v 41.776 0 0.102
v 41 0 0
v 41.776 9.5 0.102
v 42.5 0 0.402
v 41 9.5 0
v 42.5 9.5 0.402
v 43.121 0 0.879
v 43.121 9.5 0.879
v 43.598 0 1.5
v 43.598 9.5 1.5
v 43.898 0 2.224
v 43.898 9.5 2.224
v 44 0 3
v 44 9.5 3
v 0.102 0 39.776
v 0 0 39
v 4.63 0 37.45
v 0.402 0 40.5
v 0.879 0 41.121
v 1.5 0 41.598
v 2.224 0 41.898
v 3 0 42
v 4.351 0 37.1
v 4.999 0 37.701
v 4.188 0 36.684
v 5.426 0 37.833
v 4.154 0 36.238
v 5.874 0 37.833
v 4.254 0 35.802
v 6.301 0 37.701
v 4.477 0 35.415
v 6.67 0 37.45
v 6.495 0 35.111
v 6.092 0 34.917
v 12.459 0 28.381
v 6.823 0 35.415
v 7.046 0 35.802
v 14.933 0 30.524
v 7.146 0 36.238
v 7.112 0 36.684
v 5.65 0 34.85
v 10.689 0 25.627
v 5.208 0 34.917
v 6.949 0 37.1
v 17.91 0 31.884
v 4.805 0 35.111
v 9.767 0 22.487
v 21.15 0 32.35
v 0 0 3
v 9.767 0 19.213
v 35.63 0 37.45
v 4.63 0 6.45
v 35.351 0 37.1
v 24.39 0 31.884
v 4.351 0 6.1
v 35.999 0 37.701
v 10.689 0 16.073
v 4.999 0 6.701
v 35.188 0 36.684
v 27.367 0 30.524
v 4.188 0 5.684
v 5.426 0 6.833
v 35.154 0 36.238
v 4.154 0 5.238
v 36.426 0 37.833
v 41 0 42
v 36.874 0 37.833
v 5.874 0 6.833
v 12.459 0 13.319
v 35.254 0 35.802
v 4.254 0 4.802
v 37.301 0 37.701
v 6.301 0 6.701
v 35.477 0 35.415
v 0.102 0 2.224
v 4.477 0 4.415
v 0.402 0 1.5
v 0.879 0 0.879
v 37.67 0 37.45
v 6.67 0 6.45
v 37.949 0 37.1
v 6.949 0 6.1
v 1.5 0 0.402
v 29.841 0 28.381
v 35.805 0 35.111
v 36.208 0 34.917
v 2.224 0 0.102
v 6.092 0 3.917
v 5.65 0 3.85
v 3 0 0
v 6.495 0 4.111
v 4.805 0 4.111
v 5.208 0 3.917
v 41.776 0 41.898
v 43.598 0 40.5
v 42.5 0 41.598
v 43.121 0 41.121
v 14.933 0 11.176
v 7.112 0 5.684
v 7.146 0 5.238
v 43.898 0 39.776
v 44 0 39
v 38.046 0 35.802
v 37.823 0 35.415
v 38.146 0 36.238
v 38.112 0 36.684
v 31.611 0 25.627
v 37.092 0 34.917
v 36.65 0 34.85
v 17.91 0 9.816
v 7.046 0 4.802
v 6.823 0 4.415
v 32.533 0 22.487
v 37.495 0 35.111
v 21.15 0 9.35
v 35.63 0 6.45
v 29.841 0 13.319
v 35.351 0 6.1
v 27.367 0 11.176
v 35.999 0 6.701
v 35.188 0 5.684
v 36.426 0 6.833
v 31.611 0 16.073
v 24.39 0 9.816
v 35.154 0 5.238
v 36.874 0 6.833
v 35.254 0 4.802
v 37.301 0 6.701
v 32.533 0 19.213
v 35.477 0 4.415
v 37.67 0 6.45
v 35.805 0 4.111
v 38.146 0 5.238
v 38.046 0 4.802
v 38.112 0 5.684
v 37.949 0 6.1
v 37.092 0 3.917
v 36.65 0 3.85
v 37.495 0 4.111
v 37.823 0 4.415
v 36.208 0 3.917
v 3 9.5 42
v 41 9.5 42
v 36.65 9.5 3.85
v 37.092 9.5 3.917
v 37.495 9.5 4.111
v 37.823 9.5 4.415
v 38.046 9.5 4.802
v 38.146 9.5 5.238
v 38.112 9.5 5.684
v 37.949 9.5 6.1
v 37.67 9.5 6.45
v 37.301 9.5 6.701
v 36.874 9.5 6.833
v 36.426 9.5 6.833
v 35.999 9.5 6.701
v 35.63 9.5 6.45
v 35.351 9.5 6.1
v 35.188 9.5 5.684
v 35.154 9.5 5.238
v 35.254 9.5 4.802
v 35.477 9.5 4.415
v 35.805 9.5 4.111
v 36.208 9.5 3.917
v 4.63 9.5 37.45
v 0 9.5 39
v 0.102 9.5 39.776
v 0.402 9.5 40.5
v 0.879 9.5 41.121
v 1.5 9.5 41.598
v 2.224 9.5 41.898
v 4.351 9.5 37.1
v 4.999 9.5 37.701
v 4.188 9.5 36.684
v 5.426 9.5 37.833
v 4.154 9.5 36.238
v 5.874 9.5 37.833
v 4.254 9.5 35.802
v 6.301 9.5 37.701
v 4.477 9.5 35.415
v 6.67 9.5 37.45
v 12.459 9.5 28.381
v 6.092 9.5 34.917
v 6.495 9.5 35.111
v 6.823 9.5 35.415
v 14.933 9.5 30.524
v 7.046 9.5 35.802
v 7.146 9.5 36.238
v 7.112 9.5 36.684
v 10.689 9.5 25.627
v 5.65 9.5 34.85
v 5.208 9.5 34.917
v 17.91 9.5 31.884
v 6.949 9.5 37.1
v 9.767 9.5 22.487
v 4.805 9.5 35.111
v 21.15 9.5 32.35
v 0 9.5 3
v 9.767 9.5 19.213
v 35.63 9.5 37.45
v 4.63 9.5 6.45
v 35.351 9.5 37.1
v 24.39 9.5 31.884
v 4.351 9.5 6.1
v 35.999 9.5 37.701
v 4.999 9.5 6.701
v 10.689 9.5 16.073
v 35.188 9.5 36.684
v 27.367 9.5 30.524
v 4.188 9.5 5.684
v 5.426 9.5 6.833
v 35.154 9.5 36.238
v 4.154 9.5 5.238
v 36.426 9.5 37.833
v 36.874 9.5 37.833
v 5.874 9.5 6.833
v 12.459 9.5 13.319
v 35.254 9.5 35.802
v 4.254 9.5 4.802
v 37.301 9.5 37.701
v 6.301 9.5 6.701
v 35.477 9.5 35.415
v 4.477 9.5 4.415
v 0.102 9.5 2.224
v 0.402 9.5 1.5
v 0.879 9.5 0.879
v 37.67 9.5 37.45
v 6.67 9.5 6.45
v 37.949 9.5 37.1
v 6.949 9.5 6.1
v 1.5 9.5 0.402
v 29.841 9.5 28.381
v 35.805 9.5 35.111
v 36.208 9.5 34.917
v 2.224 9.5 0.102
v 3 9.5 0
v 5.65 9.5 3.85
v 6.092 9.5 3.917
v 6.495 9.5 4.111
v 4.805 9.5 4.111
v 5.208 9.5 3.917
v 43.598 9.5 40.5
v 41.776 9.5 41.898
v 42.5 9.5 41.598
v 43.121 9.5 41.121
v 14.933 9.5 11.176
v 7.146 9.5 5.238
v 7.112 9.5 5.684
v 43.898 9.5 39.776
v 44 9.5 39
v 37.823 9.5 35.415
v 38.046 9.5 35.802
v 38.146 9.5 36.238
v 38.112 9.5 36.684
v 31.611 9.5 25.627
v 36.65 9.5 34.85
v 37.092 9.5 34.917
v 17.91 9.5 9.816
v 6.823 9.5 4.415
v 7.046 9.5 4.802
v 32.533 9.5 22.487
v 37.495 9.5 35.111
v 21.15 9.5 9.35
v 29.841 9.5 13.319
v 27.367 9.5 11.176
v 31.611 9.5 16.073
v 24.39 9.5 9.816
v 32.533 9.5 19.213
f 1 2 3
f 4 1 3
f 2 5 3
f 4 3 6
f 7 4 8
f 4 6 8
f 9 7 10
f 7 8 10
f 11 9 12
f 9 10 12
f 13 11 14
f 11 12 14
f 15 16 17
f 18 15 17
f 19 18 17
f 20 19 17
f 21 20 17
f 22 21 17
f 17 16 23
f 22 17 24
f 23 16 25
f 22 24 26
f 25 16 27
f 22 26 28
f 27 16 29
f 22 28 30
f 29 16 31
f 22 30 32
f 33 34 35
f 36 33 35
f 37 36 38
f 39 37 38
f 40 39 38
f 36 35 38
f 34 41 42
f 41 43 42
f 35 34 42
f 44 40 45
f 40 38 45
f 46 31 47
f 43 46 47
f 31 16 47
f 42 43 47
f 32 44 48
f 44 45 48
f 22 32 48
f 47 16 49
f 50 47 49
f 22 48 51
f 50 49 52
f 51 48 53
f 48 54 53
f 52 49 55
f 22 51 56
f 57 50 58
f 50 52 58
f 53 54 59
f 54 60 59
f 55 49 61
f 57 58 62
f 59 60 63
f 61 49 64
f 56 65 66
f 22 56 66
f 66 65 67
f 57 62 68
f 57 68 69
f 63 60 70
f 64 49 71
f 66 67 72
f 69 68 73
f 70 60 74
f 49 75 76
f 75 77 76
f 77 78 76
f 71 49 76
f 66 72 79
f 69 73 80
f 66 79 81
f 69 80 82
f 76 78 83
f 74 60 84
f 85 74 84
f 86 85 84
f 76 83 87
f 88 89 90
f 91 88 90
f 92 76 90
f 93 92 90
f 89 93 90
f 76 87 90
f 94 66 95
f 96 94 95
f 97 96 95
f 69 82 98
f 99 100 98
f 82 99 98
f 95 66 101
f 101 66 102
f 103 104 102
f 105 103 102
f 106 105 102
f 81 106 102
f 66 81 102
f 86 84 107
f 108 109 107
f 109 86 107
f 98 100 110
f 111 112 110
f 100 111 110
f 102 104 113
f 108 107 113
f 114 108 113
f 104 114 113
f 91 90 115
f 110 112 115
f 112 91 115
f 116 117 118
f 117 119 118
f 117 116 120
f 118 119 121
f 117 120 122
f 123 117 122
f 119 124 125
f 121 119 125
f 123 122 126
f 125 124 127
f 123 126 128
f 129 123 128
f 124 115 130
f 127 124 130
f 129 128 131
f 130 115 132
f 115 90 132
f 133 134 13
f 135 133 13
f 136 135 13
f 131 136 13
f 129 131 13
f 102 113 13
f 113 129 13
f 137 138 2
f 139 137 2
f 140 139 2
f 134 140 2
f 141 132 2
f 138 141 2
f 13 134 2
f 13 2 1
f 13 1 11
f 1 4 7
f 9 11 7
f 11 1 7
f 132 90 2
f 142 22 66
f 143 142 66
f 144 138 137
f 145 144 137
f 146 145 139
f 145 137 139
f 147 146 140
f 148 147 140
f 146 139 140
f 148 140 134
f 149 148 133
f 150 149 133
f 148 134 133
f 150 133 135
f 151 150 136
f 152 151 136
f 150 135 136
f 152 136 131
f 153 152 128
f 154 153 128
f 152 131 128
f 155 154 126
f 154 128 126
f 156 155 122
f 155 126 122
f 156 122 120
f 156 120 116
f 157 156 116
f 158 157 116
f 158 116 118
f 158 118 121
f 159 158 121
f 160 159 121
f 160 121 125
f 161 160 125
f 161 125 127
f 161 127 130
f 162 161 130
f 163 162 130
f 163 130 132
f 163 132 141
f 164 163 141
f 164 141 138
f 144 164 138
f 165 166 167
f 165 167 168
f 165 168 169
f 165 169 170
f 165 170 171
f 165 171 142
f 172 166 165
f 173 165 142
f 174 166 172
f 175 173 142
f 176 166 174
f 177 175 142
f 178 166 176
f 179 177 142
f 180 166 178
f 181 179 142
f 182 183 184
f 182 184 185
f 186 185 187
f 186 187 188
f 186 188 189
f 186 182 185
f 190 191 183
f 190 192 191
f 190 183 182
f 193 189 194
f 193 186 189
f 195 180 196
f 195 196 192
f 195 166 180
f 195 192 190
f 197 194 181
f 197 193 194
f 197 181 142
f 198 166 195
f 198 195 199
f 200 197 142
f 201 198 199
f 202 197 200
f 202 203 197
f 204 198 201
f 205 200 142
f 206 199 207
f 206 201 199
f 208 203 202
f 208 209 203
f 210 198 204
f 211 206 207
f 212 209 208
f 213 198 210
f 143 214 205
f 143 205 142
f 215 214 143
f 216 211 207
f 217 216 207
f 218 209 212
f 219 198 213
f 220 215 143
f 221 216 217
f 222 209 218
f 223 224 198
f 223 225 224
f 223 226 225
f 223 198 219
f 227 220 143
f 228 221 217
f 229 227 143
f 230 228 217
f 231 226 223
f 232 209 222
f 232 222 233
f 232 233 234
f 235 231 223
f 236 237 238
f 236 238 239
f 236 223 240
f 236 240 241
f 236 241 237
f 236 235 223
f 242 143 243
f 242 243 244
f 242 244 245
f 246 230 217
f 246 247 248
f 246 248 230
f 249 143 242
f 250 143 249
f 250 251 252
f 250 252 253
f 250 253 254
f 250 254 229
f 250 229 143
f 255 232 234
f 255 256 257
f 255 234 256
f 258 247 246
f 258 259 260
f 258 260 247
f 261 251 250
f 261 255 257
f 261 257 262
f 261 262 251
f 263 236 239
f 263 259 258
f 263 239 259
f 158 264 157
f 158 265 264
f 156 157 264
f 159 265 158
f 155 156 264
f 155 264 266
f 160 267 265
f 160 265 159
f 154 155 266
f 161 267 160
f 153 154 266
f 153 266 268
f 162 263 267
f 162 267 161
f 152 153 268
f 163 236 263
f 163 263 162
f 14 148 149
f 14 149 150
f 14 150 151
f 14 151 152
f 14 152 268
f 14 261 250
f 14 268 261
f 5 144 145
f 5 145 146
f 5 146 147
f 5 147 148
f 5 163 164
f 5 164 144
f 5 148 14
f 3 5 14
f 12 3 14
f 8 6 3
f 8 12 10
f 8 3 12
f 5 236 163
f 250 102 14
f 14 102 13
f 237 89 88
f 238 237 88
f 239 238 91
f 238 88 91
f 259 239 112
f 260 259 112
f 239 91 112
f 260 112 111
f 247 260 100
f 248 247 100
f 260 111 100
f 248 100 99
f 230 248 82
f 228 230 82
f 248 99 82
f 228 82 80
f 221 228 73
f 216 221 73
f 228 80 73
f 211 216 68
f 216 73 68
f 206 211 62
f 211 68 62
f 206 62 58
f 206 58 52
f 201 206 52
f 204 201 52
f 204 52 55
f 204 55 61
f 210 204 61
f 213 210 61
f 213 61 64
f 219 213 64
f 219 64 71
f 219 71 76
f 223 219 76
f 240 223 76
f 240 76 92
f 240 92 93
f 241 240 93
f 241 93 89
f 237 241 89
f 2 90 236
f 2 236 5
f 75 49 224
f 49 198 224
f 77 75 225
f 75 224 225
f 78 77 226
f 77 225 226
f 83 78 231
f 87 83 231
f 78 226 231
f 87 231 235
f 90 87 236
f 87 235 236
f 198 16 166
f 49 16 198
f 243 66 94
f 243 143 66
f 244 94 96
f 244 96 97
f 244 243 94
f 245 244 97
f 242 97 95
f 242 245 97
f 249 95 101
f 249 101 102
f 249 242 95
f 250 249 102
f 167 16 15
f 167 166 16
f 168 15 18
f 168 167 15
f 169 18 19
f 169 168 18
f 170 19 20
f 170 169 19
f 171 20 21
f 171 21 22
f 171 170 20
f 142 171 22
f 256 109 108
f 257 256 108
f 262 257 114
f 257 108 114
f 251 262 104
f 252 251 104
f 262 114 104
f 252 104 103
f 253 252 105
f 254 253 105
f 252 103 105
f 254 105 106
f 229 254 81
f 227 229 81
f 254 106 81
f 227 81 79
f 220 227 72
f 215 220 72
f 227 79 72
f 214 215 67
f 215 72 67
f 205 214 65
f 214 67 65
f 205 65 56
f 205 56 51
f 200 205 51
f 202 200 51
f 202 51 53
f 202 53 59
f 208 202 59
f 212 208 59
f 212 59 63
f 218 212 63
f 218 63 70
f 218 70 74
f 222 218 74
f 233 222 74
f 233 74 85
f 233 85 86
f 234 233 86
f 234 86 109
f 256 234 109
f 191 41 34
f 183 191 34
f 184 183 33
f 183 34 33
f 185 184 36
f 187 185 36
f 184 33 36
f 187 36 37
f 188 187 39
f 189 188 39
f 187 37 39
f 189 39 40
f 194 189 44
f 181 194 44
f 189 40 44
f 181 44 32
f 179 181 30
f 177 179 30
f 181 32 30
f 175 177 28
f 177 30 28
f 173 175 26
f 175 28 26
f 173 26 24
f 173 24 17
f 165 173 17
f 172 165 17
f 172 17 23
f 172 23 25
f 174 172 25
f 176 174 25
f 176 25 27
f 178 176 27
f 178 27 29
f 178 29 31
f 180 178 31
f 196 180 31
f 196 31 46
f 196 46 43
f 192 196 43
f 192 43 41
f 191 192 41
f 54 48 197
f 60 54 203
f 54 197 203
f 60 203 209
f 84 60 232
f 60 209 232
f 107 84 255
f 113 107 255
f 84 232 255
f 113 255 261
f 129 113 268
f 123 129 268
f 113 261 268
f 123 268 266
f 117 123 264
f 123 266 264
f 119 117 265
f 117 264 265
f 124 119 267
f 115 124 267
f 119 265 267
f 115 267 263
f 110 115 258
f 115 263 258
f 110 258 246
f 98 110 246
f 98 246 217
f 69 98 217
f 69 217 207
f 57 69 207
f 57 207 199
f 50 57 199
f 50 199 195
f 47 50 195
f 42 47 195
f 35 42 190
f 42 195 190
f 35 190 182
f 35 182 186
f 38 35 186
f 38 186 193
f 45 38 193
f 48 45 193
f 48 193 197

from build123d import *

# Parameters (mm, degrees)
SKETCH_1_W          = 44
SKETCH_1_H          = 42
EXTRUDE_1_DEPTH     = 9.5
SKETCH_2_R          = 11.5
CUT_EXTRUDE_1_DEPTH = 62.565006294
FILLET_1_R          = 3
SKETCH_5_R          = 1.5
CUT_EXTRUDE_2_DEPTH = 62.565006294


with BuildPart() as part:
    # 草图1 → 凸台-拉伸1 (new body)
    with BuildSketch(Plane(origin=(0, 0, 0), x_dir=(1, 0, 0), z_dir=(0, 1, 0))):
        with Locations((22, -21)):
            Rectangle(SKETCH_1_W, SKETCH_1_H)
    extrude(amount=EXTRUDE_1_DEPTH)

    # 草图2 → 切除-拉伸1 (cut, through all)
    with BuildSketch(Plane(origin=(0, 9.5, 0), x_dir=(1, 0, 0), z_dir=(0, 1, 0))):
        with Locations(Location((21.15, -20.85, 0), (0, 0, 270))):
            Circle(SKETCH_2_R)
    extrude(amount=-CUT_EXTRUDE_1_DEPTH, mode=Mode.SUBTRACT)

    # 圆角1
    fillet_1_edges = [part.edges().sort_by_distance(p)[0] for p in [
        (0, 4.75, 0),
        (44, 4.75, 0),
        (44, 4.75, 42),
        (0, 4.75, 42),
    ]]
    fillet(fillet_1_edges, radius=FILLET_1_R)

    # 草图5 → 切除-拉伸2 (cut, through all)
    with BuildSketch(Plane.XZ):
        with Locations(Location((36.65, 36.35, 0), (0, 0, 270))):
            Circle(SKETCH_5_R)
        with Locations(Location((5.65, 36.35, 0), (0, 0, 270))):
            Circle(SKETCH_5_R)
        with Locations(Location((5.65, 5.35, 0), (0, 0, 270))):
            Circle(SKETCH_5_R)
        with Locations(Location((36.65, 5.35, 0), (0, 0, 270))):
            Circle(SKETCH_5_R)
    extrude(amount=-CUT_EXTRUDE_2_DEPTH, mode=Mode.SUBTRACT)


solid = part.part
